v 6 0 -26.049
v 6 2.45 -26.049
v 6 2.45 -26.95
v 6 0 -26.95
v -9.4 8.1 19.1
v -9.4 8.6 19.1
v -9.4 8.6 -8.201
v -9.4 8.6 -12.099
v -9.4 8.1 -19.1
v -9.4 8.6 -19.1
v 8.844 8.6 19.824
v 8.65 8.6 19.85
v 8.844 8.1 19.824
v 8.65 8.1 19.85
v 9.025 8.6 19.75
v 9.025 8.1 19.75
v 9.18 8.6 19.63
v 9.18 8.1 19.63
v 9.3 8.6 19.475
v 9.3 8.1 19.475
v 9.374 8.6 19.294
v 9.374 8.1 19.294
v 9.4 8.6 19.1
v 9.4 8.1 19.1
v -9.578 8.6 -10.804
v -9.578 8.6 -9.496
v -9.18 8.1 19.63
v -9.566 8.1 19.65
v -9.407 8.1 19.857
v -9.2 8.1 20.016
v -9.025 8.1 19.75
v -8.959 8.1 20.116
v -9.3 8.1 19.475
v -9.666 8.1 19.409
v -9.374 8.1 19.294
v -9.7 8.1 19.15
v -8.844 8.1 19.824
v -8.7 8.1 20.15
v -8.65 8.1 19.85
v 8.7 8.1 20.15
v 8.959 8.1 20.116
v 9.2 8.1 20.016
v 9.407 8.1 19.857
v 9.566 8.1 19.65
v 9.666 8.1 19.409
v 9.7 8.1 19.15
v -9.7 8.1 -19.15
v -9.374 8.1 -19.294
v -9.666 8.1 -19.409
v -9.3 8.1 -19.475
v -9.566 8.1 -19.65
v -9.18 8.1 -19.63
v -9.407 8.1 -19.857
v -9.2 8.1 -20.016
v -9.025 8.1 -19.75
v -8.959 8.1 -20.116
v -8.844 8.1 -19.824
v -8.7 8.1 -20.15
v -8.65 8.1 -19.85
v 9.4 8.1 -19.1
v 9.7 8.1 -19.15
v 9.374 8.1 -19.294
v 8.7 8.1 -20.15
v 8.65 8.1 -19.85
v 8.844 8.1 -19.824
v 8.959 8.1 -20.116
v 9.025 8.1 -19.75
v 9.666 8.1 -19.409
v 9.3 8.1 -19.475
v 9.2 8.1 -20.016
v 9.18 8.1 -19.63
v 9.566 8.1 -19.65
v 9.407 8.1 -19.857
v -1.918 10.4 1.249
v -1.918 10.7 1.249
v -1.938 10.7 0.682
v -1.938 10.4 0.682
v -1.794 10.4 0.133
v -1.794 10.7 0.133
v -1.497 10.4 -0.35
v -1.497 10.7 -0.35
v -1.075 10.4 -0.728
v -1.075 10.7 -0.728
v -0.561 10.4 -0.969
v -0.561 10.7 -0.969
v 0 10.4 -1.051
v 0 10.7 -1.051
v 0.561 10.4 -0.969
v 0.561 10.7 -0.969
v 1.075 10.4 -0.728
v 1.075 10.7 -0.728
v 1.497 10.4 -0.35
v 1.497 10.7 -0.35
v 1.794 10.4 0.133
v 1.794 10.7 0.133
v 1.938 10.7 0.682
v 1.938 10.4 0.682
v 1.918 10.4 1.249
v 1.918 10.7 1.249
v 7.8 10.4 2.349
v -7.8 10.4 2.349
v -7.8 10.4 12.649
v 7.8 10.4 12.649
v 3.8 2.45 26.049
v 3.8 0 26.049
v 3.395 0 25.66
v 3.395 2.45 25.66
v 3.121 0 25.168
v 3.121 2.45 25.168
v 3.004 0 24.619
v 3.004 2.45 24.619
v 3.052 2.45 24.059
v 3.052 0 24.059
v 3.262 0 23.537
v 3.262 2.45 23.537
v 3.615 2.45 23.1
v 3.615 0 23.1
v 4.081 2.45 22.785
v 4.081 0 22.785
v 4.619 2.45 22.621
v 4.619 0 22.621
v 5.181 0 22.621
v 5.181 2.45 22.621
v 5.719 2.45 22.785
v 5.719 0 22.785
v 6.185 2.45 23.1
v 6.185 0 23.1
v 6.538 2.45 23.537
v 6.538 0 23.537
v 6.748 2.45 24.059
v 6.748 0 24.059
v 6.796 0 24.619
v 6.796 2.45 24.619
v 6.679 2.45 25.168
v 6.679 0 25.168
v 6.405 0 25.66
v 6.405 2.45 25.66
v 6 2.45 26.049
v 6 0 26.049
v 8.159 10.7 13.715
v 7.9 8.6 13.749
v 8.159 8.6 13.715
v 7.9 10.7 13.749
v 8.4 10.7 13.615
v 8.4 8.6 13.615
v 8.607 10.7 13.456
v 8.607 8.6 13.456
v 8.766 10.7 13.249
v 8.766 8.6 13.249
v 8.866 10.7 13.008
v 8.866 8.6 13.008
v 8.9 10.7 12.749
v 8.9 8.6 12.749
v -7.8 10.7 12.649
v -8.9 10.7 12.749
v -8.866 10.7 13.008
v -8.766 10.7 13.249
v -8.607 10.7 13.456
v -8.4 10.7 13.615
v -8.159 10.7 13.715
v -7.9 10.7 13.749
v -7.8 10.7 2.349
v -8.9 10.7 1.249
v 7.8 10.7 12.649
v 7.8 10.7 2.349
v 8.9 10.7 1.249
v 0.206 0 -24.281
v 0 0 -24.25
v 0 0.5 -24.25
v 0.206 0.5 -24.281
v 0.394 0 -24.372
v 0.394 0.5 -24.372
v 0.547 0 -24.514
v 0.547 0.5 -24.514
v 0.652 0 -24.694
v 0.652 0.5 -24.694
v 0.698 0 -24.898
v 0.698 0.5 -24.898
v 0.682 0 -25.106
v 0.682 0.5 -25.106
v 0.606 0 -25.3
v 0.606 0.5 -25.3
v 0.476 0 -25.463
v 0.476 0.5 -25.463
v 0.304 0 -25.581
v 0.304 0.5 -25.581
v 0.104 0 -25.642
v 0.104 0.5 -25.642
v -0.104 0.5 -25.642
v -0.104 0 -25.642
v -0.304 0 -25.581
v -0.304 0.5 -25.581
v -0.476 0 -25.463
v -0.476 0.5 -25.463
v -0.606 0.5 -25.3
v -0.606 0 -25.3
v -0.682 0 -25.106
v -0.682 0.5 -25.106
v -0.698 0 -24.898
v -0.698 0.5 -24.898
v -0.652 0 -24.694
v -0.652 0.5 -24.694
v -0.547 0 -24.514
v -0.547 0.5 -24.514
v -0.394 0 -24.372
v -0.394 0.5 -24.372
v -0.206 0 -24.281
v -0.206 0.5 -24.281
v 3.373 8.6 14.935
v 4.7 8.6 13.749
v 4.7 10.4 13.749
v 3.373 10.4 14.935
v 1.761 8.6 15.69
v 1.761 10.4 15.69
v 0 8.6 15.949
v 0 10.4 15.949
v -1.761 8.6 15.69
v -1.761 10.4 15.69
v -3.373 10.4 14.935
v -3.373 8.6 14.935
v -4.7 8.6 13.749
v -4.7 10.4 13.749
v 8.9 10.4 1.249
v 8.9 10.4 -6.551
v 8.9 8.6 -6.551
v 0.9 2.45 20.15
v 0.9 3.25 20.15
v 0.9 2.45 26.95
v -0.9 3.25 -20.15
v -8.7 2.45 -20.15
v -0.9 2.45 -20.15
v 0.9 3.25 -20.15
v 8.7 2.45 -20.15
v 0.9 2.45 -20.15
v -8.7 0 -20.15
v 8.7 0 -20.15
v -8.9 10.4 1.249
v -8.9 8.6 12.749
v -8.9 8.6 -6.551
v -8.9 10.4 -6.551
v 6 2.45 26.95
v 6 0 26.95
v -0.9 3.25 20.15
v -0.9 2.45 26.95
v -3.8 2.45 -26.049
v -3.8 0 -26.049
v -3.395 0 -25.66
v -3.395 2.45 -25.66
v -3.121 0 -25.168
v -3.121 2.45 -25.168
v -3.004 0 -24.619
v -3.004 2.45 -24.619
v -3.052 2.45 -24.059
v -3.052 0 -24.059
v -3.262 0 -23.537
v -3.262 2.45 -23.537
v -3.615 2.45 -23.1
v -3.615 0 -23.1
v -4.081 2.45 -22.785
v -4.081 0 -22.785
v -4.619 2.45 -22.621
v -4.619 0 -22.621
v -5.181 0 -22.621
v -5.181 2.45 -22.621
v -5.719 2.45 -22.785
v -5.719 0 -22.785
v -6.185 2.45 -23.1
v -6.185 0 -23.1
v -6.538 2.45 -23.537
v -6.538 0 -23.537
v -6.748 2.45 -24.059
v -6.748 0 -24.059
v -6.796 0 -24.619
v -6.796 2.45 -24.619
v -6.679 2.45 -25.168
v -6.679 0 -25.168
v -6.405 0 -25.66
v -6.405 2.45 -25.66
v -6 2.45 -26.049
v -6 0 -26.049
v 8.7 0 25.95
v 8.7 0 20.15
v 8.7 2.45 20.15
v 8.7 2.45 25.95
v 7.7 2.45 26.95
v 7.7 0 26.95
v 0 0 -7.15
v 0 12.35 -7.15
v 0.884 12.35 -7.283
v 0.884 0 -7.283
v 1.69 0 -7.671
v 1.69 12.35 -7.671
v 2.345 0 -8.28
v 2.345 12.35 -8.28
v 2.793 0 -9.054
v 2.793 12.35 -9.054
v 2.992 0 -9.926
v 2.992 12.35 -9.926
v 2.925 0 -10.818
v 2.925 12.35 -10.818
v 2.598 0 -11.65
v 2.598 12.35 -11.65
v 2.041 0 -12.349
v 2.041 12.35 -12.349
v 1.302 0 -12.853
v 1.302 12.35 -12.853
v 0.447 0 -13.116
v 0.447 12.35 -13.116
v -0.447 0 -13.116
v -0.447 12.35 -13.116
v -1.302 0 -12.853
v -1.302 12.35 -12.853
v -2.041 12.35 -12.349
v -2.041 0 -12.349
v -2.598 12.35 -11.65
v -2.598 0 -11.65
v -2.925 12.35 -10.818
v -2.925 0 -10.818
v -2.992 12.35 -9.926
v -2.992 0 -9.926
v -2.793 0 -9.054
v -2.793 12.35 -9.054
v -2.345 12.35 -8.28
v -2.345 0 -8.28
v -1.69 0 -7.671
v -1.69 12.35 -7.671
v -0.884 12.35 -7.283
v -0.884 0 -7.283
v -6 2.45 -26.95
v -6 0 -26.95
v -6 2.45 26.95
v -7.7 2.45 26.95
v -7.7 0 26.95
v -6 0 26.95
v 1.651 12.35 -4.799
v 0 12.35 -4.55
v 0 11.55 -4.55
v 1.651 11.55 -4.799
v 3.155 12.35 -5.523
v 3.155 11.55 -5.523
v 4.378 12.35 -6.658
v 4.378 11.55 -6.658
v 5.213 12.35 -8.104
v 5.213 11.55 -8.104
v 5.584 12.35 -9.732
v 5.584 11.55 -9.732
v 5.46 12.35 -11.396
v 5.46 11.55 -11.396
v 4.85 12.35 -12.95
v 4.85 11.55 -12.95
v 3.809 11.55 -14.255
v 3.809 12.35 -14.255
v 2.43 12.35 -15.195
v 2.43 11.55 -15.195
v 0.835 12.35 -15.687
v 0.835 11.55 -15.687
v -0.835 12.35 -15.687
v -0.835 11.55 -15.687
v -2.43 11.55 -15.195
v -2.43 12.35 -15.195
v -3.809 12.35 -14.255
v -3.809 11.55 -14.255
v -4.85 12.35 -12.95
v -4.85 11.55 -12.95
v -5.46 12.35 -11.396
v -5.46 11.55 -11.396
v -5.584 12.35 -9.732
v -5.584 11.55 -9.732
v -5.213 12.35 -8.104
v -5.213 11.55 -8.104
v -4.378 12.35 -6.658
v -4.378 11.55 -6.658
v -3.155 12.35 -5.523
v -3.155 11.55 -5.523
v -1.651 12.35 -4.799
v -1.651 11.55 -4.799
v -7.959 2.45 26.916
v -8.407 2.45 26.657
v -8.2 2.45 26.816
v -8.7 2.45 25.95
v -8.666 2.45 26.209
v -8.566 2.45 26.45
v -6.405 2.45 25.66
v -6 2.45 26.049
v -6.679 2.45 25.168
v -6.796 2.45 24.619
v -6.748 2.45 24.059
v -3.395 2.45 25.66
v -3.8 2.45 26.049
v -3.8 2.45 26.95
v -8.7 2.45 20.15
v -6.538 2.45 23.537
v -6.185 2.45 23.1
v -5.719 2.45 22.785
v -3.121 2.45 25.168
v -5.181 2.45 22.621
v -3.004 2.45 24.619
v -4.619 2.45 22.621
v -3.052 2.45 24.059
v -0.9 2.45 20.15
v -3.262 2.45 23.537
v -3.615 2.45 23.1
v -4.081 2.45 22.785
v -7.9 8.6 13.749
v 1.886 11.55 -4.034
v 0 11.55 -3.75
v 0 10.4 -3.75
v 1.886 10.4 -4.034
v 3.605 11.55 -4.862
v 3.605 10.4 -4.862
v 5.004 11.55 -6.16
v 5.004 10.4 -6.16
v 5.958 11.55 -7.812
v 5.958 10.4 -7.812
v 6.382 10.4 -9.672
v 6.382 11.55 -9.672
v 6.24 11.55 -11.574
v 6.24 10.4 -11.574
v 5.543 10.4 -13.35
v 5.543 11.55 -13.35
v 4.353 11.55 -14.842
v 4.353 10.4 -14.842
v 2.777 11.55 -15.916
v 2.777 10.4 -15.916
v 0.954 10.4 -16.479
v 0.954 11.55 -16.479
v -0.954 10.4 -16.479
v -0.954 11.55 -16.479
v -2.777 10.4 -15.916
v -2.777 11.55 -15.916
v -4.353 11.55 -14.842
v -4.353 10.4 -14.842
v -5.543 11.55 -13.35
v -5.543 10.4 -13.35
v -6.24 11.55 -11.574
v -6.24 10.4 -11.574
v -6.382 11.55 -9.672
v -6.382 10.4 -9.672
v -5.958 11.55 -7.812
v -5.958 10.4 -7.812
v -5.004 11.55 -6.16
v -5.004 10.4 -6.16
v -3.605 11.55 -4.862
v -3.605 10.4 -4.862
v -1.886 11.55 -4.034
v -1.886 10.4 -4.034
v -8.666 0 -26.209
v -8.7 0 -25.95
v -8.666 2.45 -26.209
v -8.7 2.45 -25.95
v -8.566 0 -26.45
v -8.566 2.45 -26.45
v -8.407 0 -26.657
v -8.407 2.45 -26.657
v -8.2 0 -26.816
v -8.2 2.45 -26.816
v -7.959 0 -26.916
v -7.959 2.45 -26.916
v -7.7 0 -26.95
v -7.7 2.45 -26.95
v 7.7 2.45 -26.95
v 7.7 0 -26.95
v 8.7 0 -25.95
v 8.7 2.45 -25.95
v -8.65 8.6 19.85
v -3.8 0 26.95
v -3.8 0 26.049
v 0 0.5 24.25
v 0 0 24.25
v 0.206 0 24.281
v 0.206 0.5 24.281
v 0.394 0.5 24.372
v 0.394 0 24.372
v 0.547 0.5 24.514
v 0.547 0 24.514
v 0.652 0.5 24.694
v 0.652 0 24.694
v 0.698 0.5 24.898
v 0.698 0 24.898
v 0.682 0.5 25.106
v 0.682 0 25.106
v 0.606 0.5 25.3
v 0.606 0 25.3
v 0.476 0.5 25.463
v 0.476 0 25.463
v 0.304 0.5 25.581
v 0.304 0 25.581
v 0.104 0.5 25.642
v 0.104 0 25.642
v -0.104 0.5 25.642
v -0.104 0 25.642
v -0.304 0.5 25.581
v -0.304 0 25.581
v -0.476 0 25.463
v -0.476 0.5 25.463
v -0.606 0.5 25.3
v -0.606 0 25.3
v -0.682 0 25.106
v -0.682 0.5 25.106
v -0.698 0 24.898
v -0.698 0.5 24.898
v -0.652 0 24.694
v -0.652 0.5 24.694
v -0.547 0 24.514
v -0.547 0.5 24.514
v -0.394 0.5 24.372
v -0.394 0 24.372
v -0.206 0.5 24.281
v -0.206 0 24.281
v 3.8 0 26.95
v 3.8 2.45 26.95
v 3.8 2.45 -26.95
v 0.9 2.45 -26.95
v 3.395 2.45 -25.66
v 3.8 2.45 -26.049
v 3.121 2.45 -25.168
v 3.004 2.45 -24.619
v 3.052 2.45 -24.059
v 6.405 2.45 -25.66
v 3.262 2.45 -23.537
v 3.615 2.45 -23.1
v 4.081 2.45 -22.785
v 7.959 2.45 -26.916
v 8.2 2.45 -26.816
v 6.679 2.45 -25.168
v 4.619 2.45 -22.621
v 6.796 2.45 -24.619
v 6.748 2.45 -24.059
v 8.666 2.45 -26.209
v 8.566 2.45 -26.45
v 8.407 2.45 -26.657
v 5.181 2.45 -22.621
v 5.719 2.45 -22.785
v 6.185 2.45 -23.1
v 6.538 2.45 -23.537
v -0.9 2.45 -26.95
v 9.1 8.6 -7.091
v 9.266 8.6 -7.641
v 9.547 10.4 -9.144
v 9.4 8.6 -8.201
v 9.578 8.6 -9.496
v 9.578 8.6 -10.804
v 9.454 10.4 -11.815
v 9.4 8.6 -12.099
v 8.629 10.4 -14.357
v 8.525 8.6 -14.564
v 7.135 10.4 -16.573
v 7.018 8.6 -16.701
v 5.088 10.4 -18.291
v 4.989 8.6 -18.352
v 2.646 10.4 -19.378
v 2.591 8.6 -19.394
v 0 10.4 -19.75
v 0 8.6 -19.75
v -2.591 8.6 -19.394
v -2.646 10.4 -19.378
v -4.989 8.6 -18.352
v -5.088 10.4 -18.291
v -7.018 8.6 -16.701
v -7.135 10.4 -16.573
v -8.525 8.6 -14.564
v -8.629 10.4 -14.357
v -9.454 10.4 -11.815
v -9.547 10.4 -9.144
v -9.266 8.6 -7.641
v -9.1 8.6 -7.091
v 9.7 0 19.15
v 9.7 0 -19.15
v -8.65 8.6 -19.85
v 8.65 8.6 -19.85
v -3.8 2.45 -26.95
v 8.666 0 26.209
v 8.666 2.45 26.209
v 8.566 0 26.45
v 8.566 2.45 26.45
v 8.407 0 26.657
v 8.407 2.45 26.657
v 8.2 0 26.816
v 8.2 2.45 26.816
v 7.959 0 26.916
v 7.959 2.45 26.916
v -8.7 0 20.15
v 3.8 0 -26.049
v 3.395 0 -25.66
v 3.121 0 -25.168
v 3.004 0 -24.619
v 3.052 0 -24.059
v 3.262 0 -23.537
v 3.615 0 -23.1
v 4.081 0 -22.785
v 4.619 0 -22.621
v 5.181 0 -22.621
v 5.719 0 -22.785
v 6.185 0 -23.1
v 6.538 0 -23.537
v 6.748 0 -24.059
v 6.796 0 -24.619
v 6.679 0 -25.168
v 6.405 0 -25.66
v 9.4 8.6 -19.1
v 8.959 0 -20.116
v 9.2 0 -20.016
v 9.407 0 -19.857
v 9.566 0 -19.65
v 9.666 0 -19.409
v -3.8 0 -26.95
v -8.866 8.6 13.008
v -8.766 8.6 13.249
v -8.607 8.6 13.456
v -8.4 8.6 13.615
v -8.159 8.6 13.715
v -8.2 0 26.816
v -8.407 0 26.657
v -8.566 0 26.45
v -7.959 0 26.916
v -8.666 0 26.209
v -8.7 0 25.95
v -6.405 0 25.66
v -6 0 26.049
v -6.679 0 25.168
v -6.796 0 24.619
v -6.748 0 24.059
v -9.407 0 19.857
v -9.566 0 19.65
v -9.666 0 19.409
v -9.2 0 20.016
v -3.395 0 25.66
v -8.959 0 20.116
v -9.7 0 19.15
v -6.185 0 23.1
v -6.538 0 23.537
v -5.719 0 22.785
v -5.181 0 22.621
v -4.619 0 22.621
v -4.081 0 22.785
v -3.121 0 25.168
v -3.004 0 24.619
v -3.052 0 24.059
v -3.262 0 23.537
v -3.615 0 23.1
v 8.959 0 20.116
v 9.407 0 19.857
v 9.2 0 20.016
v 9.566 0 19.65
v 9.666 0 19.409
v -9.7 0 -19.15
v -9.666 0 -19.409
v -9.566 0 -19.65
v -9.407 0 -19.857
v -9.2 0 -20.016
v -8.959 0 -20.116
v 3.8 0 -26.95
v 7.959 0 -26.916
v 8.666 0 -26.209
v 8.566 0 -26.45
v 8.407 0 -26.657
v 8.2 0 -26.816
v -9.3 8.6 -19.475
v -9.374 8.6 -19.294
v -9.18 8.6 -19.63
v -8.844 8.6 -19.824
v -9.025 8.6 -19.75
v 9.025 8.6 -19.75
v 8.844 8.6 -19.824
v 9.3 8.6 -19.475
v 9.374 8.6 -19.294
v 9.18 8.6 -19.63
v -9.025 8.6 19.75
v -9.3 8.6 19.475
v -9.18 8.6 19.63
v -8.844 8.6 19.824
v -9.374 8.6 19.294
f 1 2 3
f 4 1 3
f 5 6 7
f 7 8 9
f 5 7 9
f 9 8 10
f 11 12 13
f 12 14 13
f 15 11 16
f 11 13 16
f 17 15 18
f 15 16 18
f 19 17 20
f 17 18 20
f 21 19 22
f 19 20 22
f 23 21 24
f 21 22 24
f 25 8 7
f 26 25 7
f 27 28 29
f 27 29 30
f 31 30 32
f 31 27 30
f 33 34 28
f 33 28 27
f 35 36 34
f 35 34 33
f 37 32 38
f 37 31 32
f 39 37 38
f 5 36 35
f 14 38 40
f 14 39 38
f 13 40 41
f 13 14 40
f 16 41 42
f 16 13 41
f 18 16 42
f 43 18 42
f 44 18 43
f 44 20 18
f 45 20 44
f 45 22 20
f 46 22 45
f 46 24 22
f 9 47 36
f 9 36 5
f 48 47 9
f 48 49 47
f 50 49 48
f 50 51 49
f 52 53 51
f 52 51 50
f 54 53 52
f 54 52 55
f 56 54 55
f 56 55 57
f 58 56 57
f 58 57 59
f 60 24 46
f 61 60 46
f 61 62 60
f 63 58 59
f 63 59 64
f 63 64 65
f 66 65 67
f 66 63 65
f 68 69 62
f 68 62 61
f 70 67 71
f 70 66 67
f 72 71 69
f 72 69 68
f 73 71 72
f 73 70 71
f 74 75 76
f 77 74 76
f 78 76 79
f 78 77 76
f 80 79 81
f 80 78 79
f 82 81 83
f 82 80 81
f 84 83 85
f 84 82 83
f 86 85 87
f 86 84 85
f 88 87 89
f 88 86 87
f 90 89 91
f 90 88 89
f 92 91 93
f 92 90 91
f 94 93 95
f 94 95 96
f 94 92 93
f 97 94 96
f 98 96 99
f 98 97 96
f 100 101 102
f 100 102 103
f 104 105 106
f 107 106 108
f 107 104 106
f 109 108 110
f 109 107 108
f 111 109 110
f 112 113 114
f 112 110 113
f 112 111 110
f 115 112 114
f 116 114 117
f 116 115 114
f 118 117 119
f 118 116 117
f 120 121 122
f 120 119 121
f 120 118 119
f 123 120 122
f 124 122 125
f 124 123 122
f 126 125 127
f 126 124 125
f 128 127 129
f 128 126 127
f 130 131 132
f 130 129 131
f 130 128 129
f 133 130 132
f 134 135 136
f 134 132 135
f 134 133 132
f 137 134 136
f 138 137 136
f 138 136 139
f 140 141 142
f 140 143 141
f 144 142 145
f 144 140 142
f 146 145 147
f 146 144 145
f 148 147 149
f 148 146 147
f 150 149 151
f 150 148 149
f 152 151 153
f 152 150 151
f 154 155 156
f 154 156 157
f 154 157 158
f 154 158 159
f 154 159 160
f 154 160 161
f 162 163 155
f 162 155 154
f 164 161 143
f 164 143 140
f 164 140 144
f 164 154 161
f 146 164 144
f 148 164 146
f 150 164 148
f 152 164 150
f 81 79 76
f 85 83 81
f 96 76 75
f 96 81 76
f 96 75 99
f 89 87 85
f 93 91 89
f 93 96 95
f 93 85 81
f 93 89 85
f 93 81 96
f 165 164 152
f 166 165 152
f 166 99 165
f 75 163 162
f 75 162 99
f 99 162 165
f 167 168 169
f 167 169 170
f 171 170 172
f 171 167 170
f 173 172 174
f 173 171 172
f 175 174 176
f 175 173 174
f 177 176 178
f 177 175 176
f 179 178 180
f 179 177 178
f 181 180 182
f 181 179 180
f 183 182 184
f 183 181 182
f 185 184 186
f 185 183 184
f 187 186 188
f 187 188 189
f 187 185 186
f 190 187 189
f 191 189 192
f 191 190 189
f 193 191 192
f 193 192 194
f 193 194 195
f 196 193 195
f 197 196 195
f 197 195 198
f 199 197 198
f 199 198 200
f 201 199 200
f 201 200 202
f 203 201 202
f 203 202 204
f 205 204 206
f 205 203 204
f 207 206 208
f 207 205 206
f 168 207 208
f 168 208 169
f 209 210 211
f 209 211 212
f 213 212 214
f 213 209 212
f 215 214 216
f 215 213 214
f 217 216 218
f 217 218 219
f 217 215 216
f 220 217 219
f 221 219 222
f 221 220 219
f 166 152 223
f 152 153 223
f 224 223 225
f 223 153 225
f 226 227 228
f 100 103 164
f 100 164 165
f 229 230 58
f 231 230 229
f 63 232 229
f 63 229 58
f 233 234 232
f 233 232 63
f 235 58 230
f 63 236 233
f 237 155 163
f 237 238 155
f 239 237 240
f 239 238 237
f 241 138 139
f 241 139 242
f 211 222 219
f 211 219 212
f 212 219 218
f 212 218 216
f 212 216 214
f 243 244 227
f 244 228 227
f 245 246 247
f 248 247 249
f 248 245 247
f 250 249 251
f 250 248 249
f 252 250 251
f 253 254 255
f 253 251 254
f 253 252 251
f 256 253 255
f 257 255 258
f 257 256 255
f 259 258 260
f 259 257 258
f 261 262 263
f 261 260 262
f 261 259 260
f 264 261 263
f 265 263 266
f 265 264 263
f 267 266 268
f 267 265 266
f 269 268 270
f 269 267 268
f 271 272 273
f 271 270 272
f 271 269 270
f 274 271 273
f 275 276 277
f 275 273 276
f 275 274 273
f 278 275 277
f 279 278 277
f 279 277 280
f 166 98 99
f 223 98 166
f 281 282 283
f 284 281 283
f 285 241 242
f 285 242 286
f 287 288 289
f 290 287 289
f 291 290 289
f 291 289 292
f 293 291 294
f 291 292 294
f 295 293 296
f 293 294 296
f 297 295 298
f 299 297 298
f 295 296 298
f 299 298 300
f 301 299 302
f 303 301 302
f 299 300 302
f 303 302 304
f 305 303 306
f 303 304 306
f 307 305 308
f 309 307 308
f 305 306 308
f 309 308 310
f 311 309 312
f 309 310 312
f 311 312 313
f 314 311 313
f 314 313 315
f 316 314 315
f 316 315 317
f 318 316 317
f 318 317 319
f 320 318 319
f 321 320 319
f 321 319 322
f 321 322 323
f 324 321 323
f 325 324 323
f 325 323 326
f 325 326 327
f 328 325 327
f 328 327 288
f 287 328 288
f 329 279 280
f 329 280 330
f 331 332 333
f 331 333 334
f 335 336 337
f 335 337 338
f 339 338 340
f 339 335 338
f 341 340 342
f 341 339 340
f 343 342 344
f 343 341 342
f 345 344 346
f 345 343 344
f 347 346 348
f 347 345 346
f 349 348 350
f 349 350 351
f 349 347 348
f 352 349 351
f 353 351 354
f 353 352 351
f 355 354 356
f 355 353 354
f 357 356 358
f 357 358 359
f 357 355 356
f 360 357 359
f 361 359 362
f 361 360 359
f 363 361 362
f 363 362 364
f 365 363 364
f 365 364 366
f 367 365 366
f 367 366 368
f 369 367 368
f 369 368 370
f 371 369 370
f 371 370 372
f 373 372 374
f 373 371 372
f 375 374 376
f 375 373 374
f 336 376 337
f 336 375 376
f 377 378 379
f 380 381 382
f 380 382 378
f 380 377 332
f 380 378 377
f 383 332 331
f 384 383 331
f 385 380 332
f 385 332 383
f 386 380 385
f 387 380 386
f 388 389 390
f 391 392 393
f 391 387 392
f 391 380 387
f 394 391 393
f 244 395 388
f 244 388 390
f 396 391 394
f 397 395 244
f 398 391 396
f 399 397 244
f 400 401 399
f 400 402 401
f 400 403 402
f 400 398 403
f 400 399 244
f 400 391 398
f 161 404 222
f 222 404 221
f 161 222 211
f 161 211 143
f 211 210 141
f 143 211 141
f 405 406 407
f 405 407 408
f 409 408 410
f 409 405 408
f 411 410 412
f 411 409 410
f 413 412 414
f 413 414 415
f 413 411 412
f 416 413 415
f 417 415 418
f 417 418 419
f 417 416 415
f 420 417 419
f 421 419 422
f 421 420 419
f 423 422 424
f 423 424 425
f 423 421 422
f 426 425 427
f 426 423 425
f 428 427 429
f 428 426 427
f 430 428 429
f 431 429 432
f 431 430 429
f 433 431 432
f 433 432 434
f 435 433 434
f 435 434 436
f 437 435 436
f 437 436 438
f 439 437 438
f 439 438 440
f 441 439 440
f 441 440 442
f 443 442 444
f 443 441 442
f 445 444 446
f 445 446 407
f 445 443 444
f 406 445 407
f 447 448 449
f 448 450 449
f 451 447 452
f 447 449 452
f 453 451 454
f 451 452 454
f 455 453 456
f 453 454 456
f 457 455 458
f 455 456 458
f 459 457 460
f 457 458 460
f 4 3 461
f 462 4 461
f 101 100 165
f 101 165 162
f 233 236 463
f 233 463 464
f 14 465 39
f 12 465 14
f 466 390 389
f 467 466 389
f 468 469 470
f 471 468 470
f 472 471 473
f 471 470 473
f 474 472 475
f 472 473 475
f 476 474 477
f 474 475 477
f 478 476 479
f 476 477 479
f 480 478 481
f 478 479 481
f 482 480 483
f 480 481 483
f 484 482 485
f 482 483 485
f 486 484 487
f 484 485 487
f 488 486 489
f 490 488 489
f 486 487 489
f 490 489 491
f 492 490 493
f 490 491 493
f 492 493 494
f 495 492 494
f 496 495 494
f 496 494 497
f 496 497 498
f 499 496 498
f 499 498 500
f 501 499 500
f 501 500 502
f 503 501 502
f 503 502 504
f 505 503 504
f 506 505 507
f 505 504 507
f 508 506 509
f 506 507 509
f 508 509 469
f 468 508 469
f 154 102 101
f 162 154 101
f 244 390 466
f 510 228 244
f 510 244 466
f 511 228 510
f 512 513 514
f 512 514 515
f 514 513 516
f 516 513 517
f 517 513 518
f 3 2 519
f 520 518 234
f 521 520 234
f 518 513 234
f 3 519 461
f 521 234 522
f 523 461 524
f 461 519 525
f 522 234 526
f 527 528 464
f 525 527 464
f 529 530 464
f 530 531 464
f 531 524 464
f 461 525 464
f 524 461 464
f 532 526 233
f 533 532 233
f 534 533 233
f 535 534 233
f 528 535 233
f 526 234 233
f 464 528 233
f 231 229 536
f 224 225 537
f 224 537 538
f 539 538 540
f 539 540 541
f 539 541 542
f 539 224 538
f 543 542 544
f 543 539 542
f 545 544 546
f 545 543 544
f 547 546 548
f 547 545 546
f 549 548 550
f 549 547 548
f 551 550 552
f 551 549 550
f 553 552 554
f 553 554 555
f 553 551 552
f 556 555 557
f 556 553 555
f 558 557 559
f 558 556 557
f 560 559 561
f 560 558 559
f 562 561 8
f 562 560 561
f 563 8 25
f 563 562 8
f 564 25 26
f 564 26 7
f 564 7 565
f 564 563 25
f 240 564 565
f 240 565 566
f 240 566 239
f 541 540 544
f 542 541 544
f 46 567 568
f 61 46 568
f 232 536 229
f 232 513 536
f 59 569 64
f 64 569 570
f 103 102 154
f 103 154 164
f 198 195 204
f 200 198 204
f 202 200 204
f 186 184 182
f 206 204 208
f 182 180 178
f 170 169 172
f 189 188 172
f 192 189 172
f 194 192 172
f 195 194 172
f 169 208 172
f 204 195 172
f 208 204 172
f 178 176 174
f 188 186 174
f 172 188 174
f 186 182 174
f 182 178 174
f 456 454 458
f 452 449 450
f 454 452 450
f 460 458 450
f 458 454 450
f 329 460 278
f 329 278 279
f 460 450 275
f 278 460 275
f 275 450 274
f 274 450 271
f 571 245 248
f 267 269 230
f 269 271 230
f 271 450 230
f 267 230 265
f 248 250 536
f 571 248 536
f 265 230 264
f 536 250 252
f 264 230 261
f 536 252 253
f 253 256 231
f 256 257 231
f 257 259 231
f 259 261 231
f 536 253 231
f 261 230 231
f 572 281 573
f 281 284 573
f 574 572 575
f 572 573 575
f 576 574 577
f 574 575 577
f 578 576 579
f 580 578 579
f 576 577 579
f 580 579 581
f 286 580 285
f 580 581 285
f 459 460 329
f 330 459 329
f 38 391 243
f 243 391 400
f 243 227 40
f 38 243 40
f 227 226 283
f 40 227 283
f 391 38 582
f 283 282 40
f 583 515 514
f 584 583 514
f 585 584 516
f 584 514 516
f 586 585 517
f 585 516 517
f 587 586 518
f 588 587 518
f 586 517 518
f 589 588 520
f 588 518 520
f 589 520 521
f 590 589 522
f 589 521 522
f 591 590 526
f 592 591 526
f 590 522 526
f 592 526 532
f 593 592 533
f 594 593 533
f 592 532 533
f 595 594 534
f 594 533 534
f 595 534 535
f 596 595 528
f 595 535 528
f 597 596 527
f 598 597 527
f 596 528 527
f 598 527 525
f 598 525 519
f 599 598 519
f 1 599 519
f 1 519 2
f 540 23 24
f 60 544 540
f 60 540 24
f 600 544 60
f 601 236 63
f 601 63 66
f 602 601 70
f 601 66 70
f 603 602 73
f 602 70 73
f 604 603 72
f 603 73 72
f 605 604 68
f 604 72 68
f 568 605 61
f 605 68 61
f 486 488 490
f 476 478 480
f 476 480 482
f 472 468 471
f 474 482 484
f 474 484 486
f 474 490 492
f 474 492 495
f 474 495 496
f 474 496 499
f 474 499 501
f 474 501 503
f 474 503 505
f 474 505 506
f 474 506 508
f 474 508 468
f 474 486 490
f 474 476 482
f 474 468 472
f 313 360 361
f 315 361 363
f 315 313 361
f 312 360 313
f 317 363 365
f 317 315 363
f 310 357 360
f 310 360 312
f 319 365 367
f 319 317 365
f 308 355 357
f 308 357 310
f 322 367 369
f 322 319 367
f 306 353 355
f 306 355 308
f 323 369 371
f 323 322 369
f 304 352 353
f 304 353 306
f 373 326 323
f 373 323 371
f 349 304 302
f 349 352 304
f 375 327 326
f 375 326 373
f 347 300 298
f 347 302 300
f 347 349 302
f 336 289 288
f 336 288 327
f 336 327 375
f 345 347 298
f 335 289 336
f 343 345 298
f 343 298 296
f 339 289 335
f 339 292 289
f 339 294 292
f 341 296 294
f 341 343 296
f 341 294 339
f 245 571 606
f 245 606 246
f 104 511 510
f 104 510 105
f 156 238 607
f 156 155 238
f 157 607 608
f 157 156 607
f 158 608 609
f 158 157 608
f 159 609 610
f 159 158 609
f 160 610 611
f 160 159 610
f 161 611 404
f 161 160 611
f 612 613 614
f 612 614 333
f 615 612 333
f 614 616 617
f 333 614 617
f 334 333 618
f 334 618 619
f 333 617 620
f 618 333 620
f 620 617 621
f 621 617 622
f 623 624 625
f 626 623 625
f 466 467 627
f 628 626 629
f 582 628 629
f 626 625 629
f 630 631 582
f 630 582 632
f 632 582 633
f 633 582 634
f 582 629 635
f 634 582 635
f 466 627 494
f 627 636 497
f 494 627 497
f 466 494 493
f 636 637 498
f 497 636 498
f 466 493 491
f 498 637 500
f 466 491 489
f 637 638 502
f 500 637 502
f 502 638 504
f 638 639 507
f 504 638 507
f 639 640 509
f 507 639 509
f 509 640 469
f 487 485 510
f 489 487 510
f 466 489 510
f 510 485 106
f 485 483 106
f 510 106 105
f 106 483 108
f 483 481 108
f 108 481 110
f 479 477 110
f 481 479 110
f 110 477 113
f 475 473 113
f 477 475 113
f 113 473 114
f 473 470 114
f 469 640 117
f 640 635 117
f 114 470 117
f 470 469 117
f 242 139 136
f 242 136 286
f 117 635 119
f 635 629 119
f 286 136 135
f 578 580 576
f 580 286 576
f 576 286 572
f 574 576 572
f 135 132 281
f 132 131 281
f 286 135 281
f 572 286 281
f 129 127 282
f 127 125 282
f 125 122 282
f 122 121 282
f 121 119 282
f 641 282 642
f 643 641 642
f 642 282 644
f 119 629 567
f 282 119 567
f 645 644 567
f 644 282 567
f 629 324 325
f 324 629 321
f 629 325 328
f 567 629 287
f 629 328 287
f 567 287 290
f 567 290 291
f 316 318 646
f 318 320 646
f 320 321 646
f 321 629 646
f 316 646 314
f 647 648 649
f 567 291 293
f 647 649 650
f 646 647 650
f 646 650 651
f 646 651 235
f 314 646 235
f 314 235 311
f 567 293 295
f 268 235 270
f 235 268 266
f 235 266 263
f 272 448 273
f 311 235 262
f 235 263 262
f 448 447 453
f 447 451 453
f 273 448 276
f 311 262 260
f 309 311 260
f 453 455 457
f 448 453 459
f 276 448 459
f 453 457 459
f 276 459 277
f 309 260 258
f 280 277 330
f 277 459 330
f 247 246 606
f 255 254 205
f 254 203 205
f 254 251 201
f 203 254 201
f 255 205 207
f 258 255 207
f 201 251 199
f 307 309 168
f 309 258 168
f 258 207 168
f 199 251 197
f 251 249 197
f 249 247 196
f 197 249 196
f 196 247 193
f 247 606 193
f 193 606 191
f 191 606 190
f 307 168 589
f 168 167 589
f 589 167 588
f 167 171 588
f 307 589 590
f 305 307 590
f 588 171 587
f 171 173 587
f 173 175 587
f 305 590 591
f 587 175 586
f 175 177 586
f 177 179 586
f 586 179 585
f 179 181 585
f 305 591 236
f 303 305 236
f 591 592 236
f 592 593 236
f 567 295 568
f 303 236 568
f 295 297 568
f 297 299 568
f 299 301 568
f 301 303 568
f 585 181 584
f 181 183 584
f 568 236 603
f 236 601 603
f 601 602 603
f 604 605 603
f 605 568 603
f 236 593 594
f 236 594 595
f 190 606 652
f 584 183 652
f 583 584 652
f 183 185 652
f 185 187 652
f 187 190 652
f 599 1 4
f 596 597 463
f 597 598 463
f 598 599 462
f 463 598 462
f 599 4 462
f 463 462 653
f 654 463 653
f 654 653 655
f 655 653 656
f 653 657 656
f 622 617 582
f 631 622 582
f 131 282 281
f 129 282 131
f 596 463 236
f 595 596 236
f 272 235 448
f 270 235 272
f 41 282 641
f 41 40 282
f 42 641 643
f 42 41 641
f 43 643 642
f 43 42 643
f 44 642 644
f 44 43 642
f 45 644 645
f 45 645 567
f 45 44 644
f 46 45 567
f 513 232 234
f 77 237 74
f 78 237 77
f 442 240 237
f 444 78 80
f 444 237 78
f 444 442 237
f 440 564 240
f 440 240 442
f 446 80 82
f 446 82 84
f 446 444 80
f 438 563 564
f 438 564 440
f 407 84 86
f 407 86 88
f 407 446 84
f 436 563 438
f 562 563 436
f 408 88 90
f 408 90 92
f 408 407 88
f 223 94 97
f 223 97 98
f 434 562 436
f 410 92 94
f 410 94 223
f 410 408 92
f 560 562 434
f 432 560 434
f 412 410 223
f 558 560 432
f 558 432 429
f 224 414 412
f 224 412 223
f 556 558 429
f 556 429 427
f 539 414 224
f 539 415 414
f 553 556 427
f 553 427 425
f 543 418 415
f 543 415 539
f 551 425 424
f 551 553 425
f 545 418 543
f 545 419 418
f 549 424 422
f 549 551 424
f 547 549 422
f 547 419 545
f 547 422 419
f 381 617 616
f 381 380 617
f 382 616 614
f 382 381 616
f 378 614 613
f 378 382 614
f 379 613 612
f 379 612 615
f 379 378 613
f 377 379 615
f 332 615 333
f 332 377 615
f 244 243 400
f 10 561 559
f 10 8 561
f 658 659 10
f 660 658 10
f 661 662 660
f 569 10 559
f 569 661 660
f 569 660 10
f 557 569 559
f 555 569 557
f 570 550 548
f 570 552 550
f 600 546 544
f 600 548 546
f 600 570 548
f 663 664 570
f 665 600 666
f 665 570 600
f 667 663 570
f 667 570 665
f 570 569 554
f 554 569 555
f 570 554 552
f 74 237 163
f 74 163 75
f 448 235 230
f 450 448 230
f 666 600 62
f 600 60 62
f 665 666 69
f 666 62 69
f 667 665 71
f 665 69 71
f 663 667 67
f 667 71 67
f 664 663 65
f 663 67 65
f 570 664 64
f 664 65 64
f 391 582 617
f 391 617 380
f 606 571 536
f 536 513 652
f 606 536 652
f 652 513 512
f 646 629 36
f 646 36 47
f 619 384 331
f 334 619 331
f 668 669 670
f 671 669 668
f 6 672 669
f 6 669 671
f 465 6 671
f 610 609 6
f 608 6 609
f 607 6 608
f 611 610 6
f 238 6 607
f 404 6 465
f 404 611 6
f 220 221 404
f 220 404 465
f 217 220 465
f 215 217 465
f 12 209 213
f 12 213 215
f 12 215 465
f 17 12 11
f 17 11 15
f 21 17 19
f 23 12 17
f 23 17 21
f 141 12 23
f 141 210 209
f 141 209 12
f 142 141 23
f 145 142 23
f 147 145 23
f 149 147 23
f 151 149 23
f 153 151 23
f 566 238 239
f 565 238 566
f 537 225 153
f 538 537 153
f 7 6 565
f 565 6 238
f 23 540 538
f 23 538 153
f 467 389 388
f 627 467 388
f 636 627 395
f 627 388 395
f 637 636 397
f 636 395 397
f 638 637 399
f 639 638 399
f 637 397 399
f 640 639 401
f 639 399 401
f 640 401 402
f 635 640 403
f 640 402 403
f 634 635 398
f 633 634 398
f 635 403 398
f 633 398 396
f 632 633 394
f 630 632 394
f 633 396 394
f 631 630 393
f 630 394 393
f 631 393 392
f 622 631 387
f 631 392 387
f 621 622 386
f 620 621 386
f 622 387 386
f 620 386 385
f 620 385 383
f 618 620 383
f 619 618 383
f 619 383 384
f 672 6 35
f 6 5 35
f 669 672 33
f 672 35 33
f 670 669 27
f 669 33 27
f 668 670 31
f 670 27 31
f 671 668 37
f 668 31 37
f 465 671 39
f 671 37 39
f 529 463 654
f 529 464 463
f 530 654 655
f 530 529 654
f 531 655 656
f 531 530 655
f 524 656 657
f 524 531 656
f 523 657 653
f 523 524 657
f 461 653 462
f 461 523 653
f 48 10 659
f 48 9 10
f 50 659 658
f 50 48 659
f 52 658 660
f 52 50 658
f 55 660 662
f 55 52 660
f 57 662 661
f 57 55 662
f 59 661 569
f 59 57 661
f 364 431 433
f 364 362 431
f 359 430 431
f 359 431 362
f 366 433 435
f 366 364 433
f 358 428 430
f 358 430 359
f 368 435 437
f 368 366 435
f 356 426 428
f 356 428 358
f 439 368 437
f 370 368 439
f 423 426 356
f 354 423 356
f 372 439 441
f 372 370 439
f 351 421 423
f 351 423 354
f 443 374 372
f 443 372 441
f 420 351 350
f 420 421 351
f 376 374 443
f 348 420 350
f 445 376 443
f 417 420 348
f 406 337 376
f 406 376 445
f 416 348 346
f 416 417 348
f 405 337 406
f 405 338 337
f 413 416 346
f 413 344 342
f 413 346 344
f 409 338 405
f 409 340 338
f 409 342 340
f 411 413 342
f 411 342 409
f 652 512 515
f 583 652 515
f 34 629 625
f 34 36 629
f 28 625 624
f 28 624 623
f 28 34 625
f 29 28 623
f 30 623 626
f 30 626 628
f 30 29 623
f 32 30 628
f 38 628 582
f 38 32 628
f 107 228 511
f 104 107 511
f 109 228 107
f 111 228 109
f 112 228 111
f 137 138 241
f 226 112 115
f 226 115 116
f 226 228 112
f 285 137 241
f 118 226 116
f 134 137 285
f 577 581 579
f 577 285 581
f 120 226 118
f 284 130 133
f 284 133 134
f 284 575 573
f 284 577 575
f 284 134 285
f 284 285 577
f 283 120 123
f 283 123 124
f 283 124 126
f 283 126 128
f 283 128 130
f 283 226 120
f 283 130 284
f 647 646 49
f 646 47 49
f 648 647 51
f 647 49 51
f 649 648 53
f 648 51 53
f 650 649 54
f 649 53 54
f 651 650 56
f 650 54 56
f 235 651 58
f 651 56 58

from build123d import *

# Parameters (mm, degrees)
BASES_W                              = 19.4
BASES_H                              = 40.3
BASE_DEPTH                           = 8.6
SHAFTHOLES_R                         = 3
SHAFT_HOLE_DEPTH                     = 24.959810099
MOUNTINGTABS_W                       = 17.4
MOUNTINGTABS_H                       = 2.45
MOUNTING_TAB_DEPTH                   = 6.8
MOUNTING_HOLE_DEPTH                  = 30.295306791
BOTTOMALIGNHOLES_R                   = 0.7
BOTTOM_ALIGN_HOLE_DEPTH              = 0.5
TRIANGULAR_TAB_DEPTH                 = 0.9
MOUNTING_TAB_FEATURES_M_COPY_1_DEPTH = 30.295306791
BASE_START                           = 1.8
BASETOPBODYS_R                       = 3
BASE_TOP_BODY_DEPTH                  = 1.8
PART_CIRCLE_DEPTH                    = 1.8
TOP_START                            = 1.15
TOPBODYCYLINDER1_R                   = 6.4
TOPBODYCYLINDER1_R_2                 = 3
TOP_BODY_CYLINDER_1_DEPTH            = 1.15
TOB_START                            = 0.8
TOPBODYCYLINDER2_R                   = 5.6
TOPBODYCYLINDER2_R_2                 = 3
TOB_BODY_CYLINDER_2_DEPTH            = 0.8
TOPBODYLABELNEST_W                   = 17.8
TOPBODYLABELNEST_H                   = 12.5
TOPBODYLABELNEST_W_2                 = 15.6
TOPBODYLABELNEST_H_2                 = 10.3
TOP_BODY_LABEL_NEST_DEPTH            = 0.3
PART_CIRCLE_2_DEPTH                  = 0.3
BORDERCUTS_W                         = 19.4
BORDERCUTS_H                         = 40.3
BORDERCUTS_W_2                       = 18.8
BORDERCUTS_H_2                       = 39.7
BORDER_CUT_DEPTH                     = 0.5
MAIN_BODY_FEATURES_F_R               = 1
BORDER_CUT_F_R                       = 0.75


with BuildPart() as part:
    # BaseS → BASE (new body)
    with BuildSketch(Plane(origin=(0, 0, 0), x_dir=(1, 0, 0), z_dir=(0, 1, 0))):
        Rectangle(BASES_W, BASES_H)
    extrude(amount=BASE_DEPTH)

    # ShaftHoleS → SHAFT HOLE (cut, through all)
    with BuildSketch(Plane(origin=(0, 8.6, 0), x_dir=(1, 0, 0), z_dir=(0, 1, 0))):
        with Locations(Location((0, 10.15, 0), (0, 0, 270))):
            Circle(SHAFTHOLES_R)
    extrude(amount=-SHAFT_HOLE_DEPTH, mode=Mode.SUBTRACT)

    # MountingTabS → MOUNTING TAB (add)
    with BuildSketch(Plane.XY.offset(20.15)):
        with Locations((0, 1.225)):
            Rectangle(MOUNTINGTABS_W, MOUNTINGTABS_H)
    mounting_tab = extrude(amount=MOUNTING_TAB_DEPTH)

    # MountingHoleS → MOUNTING HOLE (cut, through all)
    with BuildSketch(Plane(origin=(0, 2.45, 0), x_dir=(1, 0, 0), z_dir=(0, 1, 0))):
        with BuildLine():
            Line((-6, -26.049193338), (-6, -26.95))
            Line((-6, -26.95), (-3.8, -26.95))
            Line((-3.8, -26.95), (-3.8, -26.049193338))
            ThreePointArc((-3.8, -26.049193338), (-4.9, -22.6), (-6, -26.049193338))
        make_face()
    mounting_hole = extrude(amount=-MOUNTING_HOLE_DEPTH, mode=Mode.SUBTRACT)

    # MH M: MOUNTING HOLE across plane
    add(mounting_hole.mirror(Plane(origin=(0, 0, 0), x_dir=(0, 0, 1), z_dir=(1, 0, 0))), mode=Mode.SUBTRACT)

    # BottomAlignHoleS → BOTTOM ALIGN HOLE (cut)
    with BuildSketch(Plane.XZ):
        with Locations(Location((0, 24.95, 0), (0, 0, 270))):
            Circle(BOTTOMALIGNHOLES_R)
    bottom_align_hole = extrude(amount=-BOTTOM_ALIGN_HOLE_DEPTH, mode=Mode.SUBTRACT)

    # TriangularTabS → TRIANGULAR TAB (add, symmetric)
    with BuildSketch(Plane(origin=(0, 0, 0), x_dir=(0, 0, -1), z_dir=(1, 0, 0))):
        Polygon((-20.15, 2.45), (-26.95, 2.45), (-20.15, 3.25), align=None)
    triangular_tab = extrude(amount=TRIANGULAR_TAB_DEPTH, both=True)

    # MOUNTING TAB FEATURES M: MOUNTING TAB, MOUNTING HOLE, BOTTOM ALIGN HOLE, TRIANGULAR TAB across plane
    add(mounting_tab.mirror(Plane.XY))
    add(mounting_hole.mirror(Plane.XY), mode=Mode.SUBTRACT)
    add(bottom_align_hole.mirror(Plane.XY), mode=Mode.SUBTRACT)
    add(triangular_tab.mirror(Plane.XY))

    # MOUNTING TAB FEATURES M copy 1 sketch → MOUNTING TAB FEATURES M copy 1 (cut, through all)
    with BuildSketch(Plane(origin=(0, 2.45, 0), x_dir=(-1, 0, 0), z_dir=(0, 1, 0))):
        with BuildLine():
            Line((-6, -26.049193338), (-6, -26.95))
            Line((-6, -26.95), (-3.8, -26.95))
            Line((-3.8, -26.95), (-3.8, -26.049193338))
            ThreePointArc((-3.8, -26.049193338), (-4.9, -22.6), (-6, -26.049193338))
        make_face()
    extrude(amount=-MOUNTING_TAB_FEATURES_M_COPY_1_DEPTH, mode=Mode.SUBTRACT)

    # BaseTopBodyS → BASE TOP BODY (add)
    with BuildSketch(Plane(origin=(0, 8.6, 0), x_dir=(1, 0, 0), z_dir=(0, 1, 0)).offset(BASE_START)):
        with BuildLine():
            Line((-8.9, -13.748610843), (8.9, -13.748610843))
            Line((8.9, -13.748610843), (8.9, 6.551389157))
            ThreePointArc((8.9, 6.551389157), (0, 19.75), (-8.9, 6.551389157))
            Line((-8.9, 6.551389157), (-8.9, -13.748610843))
        make_face()
        with Locations(Location((0, 10.15, 0), (0, 0, 270))):
            Circle(BASETOPBODYS_R, mode=Mode.SUBTRACT)
    extrude(amount=-BASE_TOP_BODY_DEPTH)

    # PartCircleS → PART CIRCLE (add)
    with BuildSketch(Plane(origin=(0, 8.6, 0), x_dir=(1, 0, 0), z_dir=(0, 1, 0))):
        with BuildLine():
            Line((-4.7, -13.748610843), (4.7, -13.748610843))
            ThreePointArc((4.7, -13.748610843), (0, -15.948610843), (-4.7, -13.748610843))
        make_face()
    extrude(amount=PART_CIRCLE_DEPTH)

    # TopBodyCylinder1 → TOP BODY CYLINDER 1 (add)
    with BuildSketch(Plane(origin=(0, 10.4, 0), x_dir=(1, 0, 0), z_dir=(0, 1, 0)).offset(TOP_START)):
        with Locations(Location((0, 10.15, 0), (0, 0, 270))):
            Circle(TOPBODYCYLINDER1_R)
        with Locations(Location((0, 10.15, 0), (0, 0, 270))):
            Circle(TOPBODYCYLINDER1_R_2, mode=Mode.SUBTRACT)
    extrude(amount=-TOP_BODY_CYLINDER_1_DEPTH)

    # TopBodyCylinder2 → TOB BODY CYLINDER 2 (add)
    with BuildSketch(Plane(origin=(0, 11.55, 0), x_dir=(1, 0, 0), z_dir=(0, 1, 0)).offset(TOB_START)):
        with Locations(Location((0, 10.15, 0), (0, 0, 270))):
            Circle(TOPBODYCYLINDER2_R)
        with Locations(Location((0, 10.15, 0), (0, 0, 270))):
            Circle(TOPBODYCYLINDER2_R_2, mode=Mode.SUBTRACT)
    extrude(amount=-TOB_BODY_CYLINDER_2_DEPTH)

    # TopBodyLabelNest → TOP BODY LABEL NEST (add)
    with BuildSketch(Plane(origin=(0, 10.4, 0), x_dir=(1, 0, 0), z_dir=(0, 1, 0))):
        with Locations((0, -7.498610843)):
            Rectangle(TOPBODYLABELNEST_W, TOPBODYLABELNEST_H)
        with Locations((0, -7.498610843)):
            Rectangle(TOPBODYLABELNEST_W_2, TOPBODYLABELNEST_H_2, mode=Mode.SUBTRACT)
    extrude(amount=TOP_BODY_LABEL_NEST_DEPTH)

    # PartCircle2S → PART CIRCLE 2 (add)
    with BuildSketch(Plane(origin=(0, 10.4, 0), x_dir=(1, 0, 0), z_dir=(0, 1, 0))):
        with BuildLine():
            Line((1.303840481, -2.348610843), (-1.303840481, -2.348610843))
            ThreePointArc((-1.303840481, -2.348610843), (0, 1.051389157), (1.303840481, -2.348610843))
        make_face()
    extrude(amount=PART_CIRCLE_2_DEPTH)

    # BorderCutS → BORDER CUT (cut)
    with BuildSketch(Plane(origin=(0, 8.6, 0), x_dir=(1, 0, 0), z_dir=(0, 1, 0))):
        Rectangle(BORDERCUTS_W, BORDERCUTS_H)
        Rectangle(BORDERCUTS_W_2, BORDERCUTS_H_2, mode=Mode.SUBTRACT)
    extrude(amount=-BORDER_CUT_DEPTH, mode=Mode.SUBTRACT)

    # MAIN BODY FEATURES F
    main_body_features_f_edges = [part.edges().sort_by_distance(p)[0] for p in [
        (8.7, 1.225, -26.95),
        (-8.7, 1.225, -26.95),
        (-9.7, 4.05, -20.15),
        (9.7, 4.05, -20.15),
        (-8.9, 9.65, 13.748610843),
        (8.9, 9.65, 13.748610843),
        (-9.7, 4.05, 20.15),
        (9.7, 4.05, 20.15),
        (8.7, 1.225, 26.95),
        (-8.7, 1.225, 26.95),
    ]]
    fillet(main_body_features_f_edges, radius=MAIN_BODY_FEATURES_F_R - 0.0001)  # a hair under: the kernel refuses the full size

    # BORDER CUT F
    border_cut_f_edges = [part.edges().sort_by_distance(p)[0] for p in [
        (9.4, 8.35, -19.85),
        (9.4, 8.35, 19.85),
        (-9.4, 8.35, 19.85),
        (-9.4, 8.35, -19.85),
    ]]
    fillet(border_cut_f_edges, radius=BORDER_CUT_F_R)


solid = part.part
